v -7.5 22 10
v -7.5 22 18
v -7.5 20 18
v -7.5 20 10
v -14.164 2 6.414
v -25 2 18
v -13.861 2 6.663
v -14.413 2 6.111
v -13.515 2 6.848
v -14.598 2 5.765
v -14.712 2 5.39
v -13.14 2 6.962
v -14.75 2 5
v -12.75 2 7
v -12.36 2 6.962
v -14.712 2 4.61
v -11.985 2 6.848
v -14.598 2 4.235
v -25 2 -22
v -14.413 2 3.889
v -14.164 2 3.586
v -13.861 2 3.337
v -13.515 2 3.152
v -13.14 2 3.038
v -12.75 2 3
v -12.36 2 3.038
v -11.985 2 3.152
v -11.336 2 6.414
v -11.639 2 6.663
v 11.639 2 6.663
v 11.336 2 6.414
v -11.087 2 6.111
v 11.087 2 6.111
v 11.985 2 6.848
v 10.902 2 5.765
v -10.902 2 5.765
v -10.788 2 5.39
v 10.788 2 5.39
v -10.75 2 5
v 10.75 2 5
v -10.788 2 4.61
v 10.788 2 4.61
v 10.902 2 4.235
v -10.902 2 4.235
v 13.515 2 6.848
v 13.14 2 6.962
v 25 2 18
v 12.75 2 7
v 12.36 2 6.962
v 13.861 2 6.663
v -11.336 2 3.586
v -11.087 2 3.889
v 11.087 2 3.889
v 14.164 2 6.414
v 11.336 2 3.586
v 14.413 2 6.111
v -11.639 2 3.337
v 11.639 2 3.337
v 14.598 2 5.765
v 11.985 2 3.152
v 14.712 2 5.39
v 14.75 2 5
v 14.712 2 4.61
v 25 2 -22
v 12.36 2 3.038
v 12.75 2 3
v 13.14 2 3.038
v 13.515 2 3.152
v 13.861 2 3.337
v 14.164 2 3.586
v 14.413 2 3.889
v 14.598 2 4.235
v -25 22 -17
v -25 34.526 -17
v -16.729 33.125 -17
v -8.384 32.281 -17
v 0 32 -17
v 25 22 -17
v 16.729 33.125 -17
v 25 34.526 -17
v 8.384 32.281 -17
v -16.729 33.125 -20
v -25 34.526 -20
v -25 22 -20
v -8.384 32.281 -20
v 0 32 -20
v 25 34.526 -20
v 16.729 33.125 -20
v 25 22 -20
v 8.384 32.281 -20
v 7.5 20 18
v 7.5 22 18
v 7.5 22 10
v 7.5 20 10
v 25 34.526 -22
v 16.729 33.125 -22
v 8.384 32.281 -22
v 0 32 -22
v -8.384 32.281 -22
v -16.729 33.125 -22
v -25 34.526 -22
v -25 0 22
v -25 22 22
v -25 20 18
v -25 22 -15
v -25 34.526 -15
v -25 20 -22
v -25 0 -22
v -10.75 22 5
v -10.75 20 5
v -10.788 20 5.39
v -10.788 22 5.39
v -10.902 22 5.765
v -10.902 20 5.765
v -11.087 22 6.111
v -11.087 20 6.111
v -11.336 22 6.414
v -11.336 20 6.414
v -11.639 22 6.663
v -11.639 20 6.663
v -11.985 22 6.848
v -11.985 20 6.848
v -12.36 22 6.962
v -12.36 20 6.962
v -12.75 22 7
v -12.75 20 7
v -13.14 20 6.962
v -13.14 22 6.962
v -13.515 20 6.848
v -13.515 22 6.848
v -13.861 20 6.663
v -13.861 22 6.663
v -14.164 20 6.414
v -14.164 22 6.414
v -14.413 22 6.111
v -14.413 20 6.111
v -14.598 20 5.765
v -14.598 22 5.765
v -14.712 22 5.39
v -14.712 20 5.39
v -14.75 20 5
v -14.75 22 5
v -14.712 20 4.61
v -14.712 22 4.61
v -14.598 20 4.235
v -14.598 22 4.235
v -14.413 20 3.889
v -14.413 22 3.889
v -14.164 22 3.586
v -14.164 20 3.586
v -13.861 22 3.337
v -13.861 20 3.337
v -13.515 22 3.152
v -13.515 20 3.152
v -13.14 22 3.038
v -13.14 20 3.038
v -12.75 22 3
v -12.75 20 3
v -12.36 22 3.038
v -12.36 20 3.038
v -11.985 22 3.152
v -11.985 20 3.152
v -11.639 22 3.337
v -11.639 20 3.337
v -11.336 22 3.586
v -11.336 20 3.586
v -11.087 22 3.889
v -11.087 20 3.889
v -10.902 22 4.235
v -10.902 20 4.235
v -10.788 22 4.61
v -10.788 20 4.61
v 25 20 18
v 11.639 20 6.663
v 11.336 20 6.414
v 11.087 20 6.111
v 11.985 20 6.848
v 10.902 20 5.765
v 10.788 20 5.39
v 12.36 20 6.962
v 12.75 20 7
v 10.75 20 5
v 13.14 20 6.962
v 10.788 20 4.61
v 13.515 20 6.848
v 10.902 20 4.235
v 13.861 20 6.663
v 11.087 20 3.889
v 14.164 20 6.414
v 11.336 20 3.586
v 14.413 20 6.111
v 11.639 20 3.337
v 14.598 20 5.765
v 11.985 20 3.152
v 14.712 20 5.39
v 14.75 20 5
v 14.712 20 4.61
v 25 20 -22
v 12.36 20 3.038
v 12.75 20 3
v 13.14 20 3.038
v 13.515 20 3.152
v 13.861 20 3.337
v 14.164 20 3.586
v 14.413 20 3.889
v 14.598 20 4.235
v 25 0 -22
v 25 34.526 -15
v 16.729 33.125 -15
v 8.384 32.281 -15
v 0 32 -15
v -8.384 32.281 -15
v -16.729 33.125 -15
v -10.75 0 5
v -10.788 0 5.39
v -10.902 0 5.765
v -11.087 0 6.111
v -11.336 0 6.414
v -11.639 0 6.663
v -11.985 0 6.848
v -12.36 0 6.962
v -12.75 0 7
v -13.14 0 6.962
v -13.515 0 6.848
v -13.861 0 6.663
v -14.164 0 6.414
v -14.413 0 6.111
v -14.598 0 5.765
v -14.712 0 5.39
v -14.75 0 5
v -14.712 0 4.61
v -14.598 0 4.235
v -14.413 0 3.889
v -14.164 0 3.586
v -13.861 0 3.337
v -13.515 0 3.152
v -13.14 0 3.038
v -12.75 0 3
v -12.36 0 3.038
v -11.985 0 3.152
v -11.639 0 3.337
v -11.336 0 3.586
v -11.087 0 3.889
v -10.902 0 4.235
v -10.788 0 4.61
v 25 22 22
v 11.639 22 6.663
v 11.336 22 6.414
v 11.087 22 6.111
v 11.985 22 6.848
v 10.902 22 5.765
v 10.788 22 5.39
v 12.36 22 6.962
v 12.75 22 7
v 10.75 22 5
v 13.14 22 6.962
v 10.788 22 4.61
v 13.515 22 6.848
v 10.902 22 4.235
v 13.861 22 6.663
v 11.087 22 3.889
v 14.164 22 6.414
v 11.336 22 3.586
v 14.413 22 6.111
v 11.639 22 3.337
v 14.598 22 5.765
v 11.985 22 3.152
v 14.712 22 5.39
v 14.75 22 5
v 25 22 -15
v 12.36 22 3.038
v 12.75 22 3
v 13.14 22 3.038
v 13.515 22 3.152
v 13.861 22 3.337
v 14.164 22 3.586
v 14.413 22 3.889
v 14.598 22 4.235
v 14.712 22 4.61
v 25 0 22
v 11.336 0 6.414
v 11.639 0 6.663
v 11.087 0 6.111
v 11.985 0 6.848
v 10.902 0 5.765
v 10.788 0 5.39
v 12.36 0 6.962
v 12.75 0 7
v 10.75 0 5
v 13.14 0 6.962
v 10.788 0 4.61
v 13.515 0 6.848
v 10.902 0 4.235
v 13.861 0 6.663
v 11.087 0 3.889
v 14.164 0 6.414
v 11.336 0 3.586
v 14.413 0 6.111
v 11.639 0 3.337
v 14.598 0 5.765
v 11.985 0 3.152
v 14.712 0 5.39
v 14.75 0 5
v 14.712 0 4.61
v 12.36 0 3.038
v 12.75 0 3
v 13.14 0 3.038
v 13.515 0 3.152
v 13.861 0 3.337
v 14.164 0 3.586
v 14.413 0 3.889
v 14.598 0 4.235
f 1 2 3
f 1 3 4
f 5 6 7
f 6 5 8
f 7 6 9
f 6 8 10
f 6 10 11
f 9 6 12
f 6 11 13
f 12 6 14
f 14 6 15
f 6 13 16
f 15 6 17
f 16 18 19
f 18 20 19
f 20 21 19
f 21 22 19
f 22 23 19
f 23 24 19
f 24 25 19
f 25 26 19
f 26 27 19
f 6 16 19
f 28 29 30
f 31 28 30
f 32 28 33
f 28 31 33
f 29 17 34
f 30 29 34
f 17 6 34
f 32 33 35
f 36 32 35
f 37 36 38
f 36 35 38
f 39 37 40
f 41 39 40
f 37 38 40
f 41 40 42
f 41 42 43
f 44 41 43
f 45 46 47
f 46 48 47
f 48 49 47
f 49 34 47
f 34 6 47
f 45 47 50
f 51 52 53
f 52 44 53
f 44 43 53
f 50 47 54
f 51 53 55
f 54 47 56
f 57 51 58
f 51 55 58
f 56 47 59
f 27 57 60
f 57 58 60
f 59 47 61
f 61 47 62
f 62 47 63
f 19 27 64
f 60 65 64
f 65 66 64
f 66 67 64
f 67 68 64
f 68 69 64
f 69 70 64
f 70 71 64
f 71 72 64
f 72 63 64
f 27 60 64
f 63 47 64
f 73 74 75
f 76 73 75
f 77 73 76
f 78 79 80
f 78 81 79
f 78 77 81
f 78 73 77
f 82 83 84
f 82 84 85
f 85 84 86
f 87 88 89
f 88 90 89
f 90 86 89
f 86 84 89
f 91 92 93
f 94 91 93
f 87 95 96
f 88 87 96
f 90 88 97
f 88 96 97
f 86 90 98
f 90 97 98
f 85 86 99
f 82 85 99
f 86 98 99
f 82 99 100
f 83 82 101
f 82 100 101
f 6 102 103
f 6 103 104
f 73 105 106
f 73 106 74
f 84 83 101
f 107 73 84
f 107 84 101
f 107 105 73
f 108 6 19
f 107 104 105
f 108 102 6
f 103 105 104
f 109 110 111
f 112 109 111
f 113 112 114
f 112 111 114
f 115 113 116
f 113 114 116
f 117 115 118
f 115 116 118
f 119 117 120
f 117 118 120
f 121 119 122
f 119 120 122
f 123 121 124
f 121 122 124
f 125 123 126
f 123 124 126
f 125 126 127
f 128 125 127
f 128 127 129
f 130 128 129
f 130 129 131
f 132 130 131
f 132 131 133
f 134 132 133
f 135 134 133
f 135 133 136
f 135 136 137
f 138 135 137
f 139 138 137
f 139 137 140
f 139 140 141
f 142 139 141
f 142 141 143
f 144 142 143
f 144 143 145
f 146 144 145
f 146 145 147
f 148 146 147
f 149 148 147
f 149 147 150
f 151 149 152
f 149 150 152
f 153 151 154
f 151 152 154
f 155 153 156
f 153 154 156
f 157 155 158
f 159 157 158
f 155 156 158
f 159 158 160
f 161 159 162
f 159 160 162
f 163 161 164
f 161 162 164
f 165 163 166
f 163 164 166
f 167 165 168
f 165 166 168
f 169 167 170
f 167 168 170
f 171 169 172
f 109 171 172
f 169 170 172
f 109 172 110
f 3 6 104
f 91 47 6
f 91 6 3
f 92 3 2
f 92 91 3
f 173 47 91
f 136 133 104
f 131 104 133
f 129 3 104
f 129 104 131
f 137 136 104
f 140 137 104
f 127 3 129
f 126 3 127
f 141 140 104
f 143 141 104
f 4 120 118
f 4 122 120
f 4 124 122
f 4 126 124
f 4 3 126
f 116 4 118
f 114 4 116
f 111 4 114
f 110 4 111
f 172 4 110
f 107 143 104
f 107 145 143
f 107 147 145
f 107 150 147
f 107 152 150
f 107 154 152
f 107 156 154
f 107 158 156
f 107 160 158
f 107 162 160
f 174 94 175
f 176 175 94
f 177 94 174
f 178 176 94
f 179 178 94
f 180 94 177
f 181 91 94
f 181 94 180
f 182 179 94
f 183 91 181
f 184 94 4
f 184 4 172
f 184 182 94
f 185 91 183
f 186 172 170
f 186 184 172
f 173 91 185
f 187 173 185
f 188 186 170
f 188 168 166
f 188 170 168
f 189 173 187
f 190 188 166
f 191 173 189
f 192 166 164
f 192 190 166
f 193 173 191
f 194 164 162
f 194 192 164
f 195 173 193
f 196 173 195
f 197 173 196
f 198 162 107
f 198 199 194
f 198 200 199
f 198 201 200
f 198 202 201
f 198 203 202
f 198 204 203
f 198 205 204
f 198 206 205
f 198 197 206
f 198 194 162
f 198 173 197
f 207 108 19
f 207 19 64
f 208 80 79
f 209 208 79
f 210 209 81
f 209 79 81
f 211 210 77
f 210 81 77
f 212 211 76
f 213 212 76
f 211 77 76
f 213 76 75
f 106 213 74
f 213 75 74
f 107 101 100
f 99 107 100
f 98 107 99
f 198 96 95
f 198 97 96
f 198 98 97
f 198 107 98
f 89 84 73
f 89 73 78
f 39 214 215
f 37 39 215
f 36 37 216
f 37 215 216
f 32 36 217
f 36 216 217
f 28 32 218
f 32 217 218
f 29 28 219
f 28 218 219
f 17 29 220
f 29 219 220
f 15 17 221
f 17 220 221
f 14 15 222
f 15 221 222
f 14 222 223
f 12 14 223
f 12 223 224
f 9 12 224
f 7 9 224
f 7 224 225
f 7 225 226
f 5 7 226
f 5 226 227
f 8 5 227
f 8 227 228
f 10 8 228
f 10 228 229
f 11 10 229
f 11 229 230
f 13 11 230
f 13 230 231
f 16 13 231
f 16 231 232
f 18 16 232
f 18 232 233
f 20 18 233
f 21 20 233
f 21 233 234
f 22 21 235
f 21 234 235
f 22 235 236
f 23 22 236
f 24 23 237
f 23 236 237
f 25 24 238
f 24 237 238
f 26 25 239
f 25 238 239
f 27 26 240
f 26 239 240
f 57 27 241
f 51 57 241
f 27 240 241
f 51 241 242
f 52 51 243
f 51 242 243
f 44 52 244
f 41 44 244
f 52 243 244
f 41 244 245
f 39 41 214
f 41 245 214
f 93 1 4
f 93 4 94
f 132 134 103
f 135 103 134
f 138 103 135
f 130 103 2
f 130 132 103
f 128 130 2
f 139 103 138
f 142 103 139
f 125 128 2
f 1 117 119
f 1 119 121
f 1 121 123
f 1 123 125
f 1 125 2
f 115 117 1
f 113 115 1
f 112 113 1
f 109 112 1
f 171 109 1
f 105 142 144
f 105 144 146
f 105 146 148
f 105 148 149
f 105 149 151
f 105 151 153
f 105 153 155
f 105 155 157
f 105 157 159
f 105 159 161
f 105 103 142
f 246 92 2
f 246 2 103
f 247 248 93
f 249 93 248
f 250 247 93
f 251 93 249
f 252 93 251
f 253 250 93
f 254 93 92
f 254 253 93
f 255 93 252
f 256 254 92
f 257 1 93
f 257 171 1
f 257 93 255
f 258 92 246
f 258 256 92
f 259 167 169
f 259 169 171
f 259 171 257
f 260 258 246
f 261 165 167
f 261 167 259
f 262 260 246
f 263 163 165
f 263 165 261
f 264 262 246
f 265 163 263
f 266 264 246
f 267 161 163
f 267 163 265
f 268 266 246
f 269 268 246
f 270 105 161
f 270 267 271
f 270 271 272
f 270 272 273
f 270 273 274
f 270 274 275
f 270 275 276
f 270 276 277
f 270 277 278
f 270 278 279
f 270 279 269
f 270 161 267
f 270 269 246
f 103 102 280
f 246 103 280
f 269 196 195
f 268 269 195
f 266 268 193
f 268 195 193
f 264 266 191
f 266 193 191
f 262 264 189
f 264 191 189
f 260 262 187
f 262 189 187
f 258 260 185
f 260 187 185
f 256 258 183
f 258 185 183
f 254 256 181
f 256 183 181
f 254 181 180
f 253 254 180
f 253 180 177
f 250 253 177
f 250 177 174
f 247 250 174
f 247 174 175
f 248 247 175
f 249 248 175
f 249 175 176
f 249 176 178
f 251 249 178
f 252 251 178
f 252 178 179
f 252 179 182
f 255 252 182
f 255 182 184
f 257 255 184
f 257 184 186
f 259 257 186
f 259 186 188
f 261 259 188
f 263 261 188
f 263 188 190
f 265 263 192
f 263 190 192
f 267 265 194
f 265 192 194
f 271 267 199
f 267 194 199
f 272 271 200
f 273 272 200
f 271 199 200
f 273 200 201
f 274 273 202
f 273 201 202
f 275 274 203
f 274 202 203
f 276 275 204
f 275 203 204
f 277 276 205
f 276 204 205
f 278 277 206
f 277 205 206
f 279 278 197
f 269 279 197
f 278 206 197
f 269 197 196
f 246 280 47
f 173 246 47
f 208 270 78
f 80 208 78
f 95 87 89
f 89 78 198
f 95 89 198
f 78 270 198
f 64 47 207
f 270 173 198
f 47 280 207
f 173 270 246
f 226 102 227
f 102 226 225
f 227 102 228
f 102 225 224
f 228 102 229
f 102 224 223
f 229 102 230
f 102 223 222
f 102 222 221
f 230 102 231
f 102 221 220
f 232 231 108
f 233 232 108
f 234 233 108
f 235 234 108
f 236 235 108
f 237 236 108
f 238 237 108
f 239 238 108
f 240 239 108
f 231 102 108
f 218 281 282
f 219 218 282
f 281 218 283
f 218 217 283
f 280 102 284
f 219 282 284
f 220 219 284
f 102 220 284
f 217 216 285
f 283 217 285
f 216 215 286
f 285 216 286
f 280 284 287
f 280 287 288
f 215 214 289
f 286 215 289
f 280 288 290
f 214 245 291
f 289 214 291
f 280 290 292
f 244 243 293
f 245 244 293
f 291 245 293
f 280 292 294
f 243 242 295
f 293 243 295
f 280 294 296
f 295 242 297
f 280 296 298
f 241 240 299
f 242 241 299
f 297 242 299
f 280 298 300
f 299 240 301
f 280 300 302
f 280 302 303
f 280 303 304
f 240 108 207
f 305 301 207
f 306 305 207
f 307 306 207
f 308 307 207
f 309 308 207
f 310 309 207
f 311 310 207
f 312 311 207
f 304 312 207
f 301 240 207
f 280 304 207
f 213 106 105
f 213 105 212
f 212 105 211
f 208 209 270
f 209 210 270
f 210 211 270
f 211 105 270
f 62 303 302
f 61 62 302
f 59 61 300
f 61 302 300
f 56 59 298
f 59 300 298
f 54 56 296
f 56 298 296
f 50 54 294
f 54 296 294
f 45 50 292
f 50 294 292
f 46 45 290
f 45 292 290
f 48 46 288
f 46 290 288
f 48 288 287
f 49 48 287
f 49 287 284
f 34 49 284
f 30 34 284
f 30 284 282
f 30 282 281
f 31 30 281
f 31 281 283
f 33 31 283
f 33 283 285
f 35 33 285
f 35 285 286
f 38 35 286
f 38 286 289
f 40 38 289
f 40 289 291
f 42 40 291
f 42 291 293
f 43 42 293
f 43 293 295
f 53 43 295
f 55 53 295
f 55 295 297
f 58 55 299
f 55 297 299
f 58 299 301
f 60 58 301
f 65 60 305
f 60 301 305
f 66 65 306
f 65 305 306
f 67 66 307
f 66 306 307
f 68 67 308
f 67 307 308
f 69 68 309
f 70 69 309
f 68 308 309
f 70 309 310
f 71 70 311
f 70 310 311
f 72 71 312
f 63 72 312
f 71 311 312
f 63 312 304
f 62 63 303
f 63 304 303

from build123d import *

# Parameters (mm, degrees)
SKETCH_1_W          = 50
SKETCH_1_H          = 44
EXTRUDE_1_DEPTH     = 22
SKETCH_2_W          = 50
SKETCH_2_H          = 2
EXTRUDE_2_DEPTH     = 20
SKETCH_3_W          = 40
SKETCH_3_H          = 18
CUT_EXTRUDE_1_DEPTH = 50
SKETCH_4_R          = 2
CUT_EXTRUDE_2_DEPTH = 22
SKETCH_5_W          = 15
SKETCH_5_H          = 8
CUT_EXTRUDE_3_DEPTH = 2
CUT_EXTRUDE_4_DEPTH = 7


with BuildPart() as part:
    # 스케치1 → 보스-돌출1 (new body)
    with BuildSketch(Plane(origin=(0, 0, 0), x_dir=(1, 0, 0), z_dir=(0, 1, 0))):
        Rectangle(SKETCH_1_W, SKETCH_1_H)
    extrude(amount=EXTRUDE_1_DEPTH)

    # 스케치2 → 보스-돌출2 (add)
    with BuildSketch(Plane(origin=(0, 22, 0), x_dir=(1, 0, 0), z_dir=(0, 1, 0))):
        with Locations((0, 21)):
            Rectangle(SKETCH_2_W, SKETCH_2_H)
        with Locations((0, 16)):
            Rectangle(SKETCH_2_W, SKETCH_2_H)
    extrude(amount=EXTRUDE_2_DEPTH)

    # 스케치3 → 컷-돌출1 (cut)
    with BuildSketch(Plane(origin=(25, 0, 0), x_dir=(0, 0, -1), z_dir=(1, 0, 0))):
        with Locations((2, 11)):
            Rectangle(SKETCH_3_W, SKETCH_3_H)
    extrude(amount=-CUT_EXTRUDE_1_DEPTH, mode=Mode.SUBTRACT)

    # 스케치4 → 컷-돌출2 (cut)
    with BuildSketch(Plane.XZ):
        with Locations((12.75, 5)):
            Circle(SKETCH_4_R)
        with Locations((-12.75, 5)):
            Circle(SKETCH_4_R)
    extrude(amount=-CUT_EXTRUDE_2_DEPTH, mode=Mode.SUBTRACT)

    # 스케치5 → 컷-돌출3 (cut)
    with BuildSketch(Plane(origin=(0, 22, 0), x_dir=(1, 0, 0), z_dir=(0, 1, 0))):
        with Locations((0, -14)):
            Rectangle(SKETCH_5_W, SKETCH_5_H)
    extrude(amount=-CUT_EXTRUDE_3_DEPTH, mode=Mode.SUBTRACT)

    # 스케치7 → 컷-돌출4 (cut)
    with BuildSketch(Plane(origin=(0, 0, -22), x_dir=(-1, 0, 0), z_dir=(0, 0, -1))):
        with BuildLine():
            Line((25, 34.525512861), (25, 42))
            Line((25, 42), (-25, 42))
            Line((-25, 42), (-25, 34.525512861))
            ThreePointArc((-25, 34.525512861), (0, 32), (25, 34.525512861))
        make_face()
    extrude(amount=-CUT_EXTRUDE_4_DEPTH, mode=Mode.SUBTRACT)


solid = part.part
